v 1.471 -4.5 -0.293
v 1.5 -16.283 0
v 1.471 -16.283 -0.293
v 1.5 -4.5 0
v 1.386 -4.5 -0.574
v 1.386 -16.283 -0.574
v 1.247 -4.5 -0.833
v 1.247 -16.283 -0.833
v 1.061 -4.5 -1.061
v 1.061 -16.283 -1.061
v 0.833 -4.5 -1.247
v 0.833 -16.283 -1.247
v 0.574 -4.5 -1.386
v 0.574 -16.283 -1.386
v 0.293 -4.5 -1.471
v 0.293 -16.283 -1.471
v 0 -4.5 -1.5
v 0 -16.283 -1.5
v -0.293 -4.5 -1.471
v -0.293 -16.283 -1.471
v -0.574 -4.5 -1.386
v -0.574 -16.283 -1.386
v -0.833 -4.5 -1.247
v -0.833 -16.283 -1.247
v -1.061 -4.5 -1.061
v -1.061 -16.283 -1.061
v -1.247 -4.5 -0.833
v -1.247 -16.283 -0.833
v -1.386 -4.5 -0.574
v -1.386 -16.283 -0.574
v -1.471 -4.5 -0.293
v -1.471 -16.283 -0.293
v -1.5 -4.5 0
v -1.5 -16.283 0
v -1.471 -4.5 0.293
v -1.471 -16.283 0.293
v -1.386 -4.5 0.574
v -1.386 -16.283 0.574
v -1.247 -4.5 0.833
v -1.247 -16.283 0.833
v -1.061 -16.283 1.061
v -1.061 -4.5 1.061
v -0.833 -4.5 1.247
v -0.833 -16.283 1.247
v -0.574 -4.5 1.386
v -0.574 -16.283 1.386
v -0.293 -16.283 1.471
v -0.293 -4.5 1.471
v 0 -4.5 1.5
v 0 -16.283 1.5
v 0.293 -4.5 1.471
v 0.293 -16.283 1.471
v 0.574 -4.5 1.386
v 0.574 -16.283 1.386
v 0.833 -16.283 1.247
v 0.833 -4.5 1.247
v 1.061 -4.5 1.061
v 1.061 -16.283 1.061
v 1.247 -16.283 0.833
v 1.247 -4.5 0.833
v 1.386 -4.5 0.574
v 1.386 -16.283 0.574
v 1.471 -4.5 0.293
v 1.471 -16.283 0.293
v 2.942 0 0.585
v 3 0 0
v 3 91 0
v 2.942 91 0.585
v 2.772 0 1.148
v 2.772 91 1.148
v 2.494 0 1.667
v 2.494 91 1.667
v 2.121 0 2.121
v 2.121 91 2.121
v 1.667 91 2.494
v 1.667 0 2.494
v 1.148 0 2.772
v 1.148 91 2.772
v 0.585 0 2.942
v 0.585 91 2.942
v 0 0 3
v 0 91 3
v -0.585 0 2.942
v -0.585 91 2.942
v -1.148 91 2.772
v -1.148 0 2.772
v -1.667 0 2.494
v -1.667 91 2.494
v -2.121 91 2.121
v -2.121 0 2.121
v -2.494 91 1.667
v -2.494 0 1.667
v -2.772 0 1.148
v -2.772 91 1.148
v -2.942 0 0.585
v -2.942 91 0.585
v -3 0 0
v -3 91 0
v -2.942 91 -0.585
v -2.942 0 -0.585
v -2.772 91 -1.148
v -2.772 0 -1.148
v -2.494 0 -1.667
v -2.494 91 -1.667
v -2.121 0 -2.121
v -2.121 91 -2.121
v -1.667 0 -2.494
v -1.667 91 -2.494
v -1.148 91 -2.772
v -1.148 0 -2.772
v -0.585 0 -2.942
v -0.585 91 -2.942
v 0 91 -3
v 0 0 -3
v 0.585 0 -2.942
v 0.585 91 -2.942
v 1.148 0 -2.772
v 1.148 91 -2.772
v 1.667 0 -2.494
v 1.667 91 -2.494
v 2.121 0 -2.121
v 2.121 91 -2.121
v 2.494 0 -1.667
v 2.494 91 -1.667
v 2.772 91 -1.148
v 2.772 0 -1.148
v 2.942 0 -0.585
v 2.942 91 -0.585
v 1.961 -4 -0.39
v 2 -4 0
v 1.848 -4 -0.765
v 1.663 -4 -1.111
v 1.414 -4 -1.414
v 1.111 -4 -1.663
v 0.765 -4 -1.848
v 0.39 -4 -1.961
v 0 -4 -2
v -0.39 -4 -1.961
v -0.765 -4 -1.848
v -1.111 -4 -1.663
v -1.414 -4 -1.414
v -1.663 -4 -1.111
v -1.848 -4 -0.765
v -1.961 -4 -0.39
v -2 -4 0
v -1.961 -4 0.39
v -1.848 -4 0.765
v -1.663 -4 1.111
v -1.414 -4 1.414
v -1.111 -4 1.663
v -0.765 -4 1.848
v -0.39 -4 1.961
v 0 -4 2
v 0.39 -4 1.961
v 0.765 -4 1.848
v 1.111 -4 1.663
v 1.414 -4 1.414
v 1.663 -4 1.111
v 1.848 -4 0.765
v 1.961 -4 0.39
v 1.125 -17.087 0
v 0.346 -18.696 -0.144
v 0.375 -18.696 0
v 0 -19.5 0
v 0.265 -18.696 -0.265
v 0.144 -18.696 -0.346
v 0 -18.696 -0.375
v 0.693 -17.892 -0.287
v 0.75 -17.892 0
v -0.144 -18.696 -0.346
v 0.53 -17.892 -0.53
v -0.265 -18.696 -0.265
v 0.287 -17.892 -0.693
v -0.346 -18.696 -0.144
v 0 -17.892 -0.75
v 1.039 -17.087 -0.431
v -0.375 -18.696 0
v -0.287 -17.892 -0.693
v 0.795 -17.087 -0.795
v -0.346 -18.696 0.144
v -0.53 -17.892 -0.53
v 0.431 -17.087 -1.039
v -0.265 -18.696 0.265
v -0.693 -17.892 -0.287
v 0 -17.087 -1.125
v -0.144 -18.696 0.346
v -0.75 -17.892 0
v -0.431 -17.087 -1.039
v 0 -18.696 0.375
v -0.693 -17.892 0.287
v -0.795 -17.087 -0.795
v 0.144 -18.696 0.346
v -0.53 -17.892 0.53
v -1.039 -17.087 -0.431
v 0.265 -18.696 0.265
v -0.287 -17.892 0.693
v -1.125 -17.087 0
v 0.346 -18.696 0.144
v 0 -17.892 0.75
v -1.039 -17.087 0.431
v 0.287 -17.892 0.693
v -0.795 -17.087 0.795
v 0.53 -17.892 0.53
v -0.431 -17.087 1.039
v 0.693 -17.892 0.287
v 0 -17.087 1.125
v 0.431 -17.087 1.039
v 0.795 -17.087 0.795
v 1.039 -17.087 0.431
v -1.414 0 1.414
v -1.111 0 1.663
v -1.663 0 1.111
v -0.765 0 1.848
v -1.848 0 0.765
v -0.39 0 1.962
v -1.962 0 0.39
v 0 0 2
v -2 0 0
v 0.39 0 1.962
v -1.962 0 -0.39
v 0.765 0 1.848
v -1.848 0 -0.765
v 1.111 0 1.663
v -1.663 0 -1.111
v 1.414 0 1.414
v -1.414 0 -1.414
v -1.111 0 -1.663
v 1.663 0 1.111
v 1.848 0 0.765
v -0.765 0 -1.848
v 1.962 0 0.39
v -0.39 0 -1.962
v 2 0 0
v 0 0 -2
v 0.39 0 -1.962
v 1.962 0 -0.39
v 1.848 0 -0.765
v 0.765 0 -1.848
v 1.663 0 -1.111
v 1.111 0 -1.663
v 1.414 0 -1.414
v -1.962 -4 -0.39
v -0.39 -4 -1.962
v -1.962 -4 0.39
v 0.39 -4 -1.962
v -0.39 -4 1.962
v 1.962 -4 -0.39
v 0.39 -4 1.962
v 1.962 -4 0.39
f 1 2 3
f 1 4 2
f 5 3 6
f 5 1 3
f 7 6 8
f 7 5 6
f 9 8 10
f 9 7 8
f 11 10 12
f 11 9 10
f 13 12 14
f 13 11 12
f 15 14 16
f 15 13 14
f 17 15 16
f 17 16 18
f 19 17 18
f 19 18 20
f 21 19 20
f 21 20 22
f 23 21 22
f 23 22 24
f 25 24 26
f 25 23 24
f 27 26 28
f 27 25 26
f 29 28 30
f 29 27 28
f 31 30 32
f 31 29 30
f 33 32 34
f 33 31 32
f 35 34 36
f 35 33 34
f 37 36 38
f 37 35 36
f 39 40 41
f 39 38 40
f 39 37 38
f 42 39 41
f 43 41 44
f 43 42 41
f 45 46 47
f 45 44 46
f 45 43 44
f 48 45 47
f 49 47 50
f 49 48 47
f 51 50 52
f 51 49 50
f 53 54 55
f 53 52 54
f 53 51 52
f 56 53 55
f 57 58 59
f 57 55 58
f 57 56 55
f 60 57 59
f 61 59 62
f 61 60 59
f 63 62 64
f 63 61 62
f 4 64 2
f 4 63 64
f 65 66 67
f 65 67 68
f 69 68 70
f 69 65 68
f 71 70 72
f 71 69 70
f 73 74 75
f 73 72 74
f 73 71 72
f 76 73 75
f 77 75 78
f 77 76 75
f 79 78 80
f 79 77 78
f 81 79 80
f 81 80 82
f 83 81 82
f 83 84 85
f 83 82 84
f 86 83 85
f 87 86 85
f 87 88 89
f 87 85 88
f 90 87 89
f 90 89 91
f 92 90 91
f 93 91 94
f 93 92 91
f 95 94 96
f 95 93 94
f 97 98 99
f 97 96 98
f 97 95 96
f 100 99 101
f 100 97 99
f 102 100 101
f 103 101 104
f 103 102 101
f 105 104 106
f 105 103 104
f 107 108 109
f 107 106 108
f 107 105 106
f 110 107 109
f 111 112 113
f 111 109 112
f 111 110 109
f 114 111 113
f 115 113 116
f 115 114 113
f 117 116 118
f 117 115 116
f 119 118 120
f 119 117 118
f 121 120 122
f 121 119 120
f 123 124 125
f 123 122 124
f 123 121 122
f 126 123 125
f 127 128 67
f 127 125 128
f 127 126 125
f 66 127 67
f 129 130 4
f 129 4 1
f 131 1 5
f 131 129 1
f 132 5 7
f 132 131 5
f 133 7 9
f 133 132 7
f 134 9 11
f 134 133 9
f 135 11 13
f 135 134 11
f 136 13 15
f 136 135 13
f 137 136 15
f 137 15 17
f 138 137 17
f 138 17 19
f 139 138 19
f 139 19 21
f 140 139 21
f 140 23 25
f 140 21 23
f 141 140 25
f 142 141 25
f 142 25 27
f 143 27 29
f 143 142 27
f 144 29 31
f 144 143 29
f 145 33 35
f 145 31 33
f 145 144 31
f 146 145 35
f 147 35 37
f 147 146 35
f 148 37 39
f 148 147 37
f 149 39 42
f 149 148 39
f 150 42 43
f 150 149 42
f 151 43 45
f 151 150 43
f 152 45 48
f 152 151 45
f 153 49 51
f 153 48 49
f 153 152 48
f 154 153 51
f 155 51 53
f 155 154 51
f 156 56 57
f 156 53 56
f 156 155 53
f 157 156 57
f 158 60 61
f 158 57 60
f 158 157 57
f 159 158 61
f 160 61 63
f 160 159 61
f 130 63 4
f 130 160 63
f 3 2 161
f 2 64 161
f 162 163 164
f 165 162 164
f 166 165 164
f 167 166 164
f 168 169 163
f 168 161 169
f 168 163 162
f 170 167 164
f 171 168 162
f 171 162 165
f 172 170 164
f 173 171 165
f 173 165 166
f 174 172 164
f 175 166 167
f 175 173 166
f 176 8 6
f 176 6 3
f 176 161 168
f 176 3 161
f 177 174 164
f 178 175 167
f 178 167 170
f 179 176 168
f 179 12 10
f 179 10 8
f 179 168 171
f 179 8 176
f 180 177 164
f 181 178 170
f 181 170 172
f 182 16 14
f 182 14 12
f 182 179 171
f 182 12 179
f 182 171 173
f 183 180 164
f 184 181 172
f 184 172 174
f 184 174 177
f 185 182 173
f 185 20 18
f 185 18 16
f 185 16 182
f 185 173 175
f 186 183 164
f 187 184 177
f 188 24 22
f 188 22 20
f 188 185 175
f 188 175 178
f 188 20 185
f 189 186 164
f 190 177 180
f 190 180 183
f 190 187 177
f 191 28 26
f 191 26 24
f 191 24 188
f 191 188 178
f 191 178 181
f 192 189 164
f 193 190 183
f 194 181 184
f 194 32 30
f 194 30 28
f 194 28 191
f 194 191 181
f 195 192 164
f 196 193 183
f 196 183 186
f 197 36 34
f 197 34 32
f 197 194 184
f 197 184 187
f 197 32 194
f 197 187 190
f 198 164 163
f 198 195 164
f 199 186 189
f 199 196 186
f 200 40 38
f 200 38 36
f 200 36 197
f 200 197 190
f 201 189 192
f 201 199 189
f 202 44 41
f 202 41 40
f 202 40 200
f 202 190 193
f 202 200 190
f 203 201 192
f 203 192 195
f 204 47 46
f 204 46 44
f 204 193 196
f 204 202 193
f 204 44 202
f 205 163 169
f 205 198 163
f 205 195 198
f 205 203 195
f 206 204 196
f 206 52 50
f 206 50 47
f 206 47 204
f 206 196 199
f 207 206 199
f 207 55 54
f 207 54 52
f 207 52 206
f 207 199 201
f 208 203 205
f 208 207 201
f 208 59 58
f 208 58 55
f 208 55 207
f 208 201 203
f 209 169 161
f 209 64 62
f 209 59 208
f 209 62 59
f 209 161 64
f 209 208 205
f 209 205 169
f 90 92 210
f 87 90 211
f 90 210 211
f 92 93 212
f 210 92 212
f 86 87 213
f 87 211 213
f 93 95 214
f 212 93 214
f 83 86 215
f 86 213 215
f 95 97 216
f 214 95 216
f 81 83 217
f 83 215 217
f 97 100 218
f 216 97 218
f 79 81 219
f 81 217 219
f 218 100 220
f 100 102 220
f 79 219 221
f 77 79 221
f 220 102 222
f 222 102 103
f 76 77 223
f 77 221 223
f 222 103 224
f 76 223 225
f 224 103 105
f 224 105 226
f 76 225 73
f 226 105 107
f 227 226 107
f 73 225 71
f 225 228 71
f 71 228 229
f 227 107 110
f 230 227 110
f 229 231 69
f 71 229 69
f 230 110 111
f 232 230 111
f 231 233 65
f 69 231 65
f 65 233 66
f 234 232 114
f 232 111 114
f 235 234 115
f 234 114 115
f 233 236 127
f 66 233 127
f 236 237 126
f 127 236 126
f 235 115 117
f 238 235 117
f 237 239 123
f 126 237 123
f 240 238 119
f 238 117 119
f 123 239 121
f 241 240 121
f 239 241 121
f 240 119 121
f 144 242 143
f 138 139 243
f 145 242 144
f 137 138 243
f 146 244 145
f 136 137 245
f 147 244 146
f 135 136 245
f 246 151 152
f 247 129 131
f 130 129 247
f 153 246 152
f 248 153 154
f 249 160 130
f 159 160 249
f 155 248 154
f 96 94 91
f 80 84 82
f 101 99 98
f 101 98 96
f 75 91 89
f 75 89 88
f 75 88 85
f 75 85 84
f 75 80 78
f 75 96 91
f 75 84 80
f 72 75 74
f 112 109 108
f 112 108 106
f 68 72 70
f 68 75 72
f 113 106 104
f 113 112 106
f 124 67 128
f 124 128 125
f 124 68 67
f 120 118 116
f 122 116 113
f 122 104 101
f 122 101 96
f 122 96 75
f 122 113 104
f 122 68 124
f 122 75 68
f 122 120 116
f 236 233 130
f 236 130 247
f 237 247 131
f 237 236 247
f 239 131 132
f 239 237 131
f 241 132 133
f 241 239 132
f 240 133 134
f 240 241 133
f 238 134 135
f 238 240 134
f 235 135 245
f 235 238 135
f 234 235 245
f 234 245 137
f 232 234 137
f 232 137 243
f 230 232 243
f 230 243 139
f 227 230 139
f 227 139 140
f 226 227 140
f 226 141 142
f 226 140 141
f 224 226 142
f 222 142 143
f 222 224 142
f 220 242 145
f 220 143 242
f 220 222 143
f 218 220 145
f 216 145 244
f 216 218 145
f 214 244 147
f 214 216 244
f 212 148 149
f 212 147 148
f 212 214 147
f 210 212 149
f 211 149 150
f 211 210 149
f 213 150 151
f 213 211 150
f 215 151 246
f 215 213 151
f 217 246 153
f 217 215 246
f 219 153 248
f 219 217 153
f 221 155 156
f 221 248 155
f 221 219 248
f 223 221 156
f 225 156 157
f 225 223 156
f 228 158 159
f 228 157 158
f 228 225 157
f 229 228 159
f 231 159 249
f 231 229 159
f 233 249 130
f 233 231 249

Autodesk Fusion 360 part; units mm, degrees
sketch "Sketch1" plane through (0, 0, 0) normal (0, 1, 0) x (1, 0, 0)
  circle A0 centre (0, 0) radius 3
  dimension "d1" = 6
extrude "Extrude1" add sketch "Sketch1" along normal blind 91
sketch "Sketch2" plane through (0, 0, 0) normal (0, -1, 0) x (1, 0, 0)
  circle A0 centre (0, 0) radius 3
  circle A1 centre (0, 0) radius 2
  dimension "d4" = 4
extrude "Extrude2" add sketch "Sketch2" along normal blind 4 contours A1
sketch "Sketch3" plane through (0, -4, 0) normal (0, -1, 0) x (1, 0, 0)
  circle A0 centre (0, 0) radius 2
  circle A1 centre (0, 0) radius 1.5
  dimension "d7" = 3
extrude "Extrude3" add sketch "Sketch3" along normal blind 17 contours A1
chamfer "Chamfer1" distance 0.5 angle 45 1 edges at (-1.3985, -4, 0.5424)
extrude "Extrude4" cut 1 faces at (0.567, -21, -0.5383) along direction (0, 1, 0) blind 1.5
chamfer "Chamfer3" distance 1.5 angle 65 1 edges at (-1.3985, -19.5, 0.5424) measured on face at (0.567, -19.5, -0.5383)
equation "d13 = 19.5 mm - 21.00 mm"
